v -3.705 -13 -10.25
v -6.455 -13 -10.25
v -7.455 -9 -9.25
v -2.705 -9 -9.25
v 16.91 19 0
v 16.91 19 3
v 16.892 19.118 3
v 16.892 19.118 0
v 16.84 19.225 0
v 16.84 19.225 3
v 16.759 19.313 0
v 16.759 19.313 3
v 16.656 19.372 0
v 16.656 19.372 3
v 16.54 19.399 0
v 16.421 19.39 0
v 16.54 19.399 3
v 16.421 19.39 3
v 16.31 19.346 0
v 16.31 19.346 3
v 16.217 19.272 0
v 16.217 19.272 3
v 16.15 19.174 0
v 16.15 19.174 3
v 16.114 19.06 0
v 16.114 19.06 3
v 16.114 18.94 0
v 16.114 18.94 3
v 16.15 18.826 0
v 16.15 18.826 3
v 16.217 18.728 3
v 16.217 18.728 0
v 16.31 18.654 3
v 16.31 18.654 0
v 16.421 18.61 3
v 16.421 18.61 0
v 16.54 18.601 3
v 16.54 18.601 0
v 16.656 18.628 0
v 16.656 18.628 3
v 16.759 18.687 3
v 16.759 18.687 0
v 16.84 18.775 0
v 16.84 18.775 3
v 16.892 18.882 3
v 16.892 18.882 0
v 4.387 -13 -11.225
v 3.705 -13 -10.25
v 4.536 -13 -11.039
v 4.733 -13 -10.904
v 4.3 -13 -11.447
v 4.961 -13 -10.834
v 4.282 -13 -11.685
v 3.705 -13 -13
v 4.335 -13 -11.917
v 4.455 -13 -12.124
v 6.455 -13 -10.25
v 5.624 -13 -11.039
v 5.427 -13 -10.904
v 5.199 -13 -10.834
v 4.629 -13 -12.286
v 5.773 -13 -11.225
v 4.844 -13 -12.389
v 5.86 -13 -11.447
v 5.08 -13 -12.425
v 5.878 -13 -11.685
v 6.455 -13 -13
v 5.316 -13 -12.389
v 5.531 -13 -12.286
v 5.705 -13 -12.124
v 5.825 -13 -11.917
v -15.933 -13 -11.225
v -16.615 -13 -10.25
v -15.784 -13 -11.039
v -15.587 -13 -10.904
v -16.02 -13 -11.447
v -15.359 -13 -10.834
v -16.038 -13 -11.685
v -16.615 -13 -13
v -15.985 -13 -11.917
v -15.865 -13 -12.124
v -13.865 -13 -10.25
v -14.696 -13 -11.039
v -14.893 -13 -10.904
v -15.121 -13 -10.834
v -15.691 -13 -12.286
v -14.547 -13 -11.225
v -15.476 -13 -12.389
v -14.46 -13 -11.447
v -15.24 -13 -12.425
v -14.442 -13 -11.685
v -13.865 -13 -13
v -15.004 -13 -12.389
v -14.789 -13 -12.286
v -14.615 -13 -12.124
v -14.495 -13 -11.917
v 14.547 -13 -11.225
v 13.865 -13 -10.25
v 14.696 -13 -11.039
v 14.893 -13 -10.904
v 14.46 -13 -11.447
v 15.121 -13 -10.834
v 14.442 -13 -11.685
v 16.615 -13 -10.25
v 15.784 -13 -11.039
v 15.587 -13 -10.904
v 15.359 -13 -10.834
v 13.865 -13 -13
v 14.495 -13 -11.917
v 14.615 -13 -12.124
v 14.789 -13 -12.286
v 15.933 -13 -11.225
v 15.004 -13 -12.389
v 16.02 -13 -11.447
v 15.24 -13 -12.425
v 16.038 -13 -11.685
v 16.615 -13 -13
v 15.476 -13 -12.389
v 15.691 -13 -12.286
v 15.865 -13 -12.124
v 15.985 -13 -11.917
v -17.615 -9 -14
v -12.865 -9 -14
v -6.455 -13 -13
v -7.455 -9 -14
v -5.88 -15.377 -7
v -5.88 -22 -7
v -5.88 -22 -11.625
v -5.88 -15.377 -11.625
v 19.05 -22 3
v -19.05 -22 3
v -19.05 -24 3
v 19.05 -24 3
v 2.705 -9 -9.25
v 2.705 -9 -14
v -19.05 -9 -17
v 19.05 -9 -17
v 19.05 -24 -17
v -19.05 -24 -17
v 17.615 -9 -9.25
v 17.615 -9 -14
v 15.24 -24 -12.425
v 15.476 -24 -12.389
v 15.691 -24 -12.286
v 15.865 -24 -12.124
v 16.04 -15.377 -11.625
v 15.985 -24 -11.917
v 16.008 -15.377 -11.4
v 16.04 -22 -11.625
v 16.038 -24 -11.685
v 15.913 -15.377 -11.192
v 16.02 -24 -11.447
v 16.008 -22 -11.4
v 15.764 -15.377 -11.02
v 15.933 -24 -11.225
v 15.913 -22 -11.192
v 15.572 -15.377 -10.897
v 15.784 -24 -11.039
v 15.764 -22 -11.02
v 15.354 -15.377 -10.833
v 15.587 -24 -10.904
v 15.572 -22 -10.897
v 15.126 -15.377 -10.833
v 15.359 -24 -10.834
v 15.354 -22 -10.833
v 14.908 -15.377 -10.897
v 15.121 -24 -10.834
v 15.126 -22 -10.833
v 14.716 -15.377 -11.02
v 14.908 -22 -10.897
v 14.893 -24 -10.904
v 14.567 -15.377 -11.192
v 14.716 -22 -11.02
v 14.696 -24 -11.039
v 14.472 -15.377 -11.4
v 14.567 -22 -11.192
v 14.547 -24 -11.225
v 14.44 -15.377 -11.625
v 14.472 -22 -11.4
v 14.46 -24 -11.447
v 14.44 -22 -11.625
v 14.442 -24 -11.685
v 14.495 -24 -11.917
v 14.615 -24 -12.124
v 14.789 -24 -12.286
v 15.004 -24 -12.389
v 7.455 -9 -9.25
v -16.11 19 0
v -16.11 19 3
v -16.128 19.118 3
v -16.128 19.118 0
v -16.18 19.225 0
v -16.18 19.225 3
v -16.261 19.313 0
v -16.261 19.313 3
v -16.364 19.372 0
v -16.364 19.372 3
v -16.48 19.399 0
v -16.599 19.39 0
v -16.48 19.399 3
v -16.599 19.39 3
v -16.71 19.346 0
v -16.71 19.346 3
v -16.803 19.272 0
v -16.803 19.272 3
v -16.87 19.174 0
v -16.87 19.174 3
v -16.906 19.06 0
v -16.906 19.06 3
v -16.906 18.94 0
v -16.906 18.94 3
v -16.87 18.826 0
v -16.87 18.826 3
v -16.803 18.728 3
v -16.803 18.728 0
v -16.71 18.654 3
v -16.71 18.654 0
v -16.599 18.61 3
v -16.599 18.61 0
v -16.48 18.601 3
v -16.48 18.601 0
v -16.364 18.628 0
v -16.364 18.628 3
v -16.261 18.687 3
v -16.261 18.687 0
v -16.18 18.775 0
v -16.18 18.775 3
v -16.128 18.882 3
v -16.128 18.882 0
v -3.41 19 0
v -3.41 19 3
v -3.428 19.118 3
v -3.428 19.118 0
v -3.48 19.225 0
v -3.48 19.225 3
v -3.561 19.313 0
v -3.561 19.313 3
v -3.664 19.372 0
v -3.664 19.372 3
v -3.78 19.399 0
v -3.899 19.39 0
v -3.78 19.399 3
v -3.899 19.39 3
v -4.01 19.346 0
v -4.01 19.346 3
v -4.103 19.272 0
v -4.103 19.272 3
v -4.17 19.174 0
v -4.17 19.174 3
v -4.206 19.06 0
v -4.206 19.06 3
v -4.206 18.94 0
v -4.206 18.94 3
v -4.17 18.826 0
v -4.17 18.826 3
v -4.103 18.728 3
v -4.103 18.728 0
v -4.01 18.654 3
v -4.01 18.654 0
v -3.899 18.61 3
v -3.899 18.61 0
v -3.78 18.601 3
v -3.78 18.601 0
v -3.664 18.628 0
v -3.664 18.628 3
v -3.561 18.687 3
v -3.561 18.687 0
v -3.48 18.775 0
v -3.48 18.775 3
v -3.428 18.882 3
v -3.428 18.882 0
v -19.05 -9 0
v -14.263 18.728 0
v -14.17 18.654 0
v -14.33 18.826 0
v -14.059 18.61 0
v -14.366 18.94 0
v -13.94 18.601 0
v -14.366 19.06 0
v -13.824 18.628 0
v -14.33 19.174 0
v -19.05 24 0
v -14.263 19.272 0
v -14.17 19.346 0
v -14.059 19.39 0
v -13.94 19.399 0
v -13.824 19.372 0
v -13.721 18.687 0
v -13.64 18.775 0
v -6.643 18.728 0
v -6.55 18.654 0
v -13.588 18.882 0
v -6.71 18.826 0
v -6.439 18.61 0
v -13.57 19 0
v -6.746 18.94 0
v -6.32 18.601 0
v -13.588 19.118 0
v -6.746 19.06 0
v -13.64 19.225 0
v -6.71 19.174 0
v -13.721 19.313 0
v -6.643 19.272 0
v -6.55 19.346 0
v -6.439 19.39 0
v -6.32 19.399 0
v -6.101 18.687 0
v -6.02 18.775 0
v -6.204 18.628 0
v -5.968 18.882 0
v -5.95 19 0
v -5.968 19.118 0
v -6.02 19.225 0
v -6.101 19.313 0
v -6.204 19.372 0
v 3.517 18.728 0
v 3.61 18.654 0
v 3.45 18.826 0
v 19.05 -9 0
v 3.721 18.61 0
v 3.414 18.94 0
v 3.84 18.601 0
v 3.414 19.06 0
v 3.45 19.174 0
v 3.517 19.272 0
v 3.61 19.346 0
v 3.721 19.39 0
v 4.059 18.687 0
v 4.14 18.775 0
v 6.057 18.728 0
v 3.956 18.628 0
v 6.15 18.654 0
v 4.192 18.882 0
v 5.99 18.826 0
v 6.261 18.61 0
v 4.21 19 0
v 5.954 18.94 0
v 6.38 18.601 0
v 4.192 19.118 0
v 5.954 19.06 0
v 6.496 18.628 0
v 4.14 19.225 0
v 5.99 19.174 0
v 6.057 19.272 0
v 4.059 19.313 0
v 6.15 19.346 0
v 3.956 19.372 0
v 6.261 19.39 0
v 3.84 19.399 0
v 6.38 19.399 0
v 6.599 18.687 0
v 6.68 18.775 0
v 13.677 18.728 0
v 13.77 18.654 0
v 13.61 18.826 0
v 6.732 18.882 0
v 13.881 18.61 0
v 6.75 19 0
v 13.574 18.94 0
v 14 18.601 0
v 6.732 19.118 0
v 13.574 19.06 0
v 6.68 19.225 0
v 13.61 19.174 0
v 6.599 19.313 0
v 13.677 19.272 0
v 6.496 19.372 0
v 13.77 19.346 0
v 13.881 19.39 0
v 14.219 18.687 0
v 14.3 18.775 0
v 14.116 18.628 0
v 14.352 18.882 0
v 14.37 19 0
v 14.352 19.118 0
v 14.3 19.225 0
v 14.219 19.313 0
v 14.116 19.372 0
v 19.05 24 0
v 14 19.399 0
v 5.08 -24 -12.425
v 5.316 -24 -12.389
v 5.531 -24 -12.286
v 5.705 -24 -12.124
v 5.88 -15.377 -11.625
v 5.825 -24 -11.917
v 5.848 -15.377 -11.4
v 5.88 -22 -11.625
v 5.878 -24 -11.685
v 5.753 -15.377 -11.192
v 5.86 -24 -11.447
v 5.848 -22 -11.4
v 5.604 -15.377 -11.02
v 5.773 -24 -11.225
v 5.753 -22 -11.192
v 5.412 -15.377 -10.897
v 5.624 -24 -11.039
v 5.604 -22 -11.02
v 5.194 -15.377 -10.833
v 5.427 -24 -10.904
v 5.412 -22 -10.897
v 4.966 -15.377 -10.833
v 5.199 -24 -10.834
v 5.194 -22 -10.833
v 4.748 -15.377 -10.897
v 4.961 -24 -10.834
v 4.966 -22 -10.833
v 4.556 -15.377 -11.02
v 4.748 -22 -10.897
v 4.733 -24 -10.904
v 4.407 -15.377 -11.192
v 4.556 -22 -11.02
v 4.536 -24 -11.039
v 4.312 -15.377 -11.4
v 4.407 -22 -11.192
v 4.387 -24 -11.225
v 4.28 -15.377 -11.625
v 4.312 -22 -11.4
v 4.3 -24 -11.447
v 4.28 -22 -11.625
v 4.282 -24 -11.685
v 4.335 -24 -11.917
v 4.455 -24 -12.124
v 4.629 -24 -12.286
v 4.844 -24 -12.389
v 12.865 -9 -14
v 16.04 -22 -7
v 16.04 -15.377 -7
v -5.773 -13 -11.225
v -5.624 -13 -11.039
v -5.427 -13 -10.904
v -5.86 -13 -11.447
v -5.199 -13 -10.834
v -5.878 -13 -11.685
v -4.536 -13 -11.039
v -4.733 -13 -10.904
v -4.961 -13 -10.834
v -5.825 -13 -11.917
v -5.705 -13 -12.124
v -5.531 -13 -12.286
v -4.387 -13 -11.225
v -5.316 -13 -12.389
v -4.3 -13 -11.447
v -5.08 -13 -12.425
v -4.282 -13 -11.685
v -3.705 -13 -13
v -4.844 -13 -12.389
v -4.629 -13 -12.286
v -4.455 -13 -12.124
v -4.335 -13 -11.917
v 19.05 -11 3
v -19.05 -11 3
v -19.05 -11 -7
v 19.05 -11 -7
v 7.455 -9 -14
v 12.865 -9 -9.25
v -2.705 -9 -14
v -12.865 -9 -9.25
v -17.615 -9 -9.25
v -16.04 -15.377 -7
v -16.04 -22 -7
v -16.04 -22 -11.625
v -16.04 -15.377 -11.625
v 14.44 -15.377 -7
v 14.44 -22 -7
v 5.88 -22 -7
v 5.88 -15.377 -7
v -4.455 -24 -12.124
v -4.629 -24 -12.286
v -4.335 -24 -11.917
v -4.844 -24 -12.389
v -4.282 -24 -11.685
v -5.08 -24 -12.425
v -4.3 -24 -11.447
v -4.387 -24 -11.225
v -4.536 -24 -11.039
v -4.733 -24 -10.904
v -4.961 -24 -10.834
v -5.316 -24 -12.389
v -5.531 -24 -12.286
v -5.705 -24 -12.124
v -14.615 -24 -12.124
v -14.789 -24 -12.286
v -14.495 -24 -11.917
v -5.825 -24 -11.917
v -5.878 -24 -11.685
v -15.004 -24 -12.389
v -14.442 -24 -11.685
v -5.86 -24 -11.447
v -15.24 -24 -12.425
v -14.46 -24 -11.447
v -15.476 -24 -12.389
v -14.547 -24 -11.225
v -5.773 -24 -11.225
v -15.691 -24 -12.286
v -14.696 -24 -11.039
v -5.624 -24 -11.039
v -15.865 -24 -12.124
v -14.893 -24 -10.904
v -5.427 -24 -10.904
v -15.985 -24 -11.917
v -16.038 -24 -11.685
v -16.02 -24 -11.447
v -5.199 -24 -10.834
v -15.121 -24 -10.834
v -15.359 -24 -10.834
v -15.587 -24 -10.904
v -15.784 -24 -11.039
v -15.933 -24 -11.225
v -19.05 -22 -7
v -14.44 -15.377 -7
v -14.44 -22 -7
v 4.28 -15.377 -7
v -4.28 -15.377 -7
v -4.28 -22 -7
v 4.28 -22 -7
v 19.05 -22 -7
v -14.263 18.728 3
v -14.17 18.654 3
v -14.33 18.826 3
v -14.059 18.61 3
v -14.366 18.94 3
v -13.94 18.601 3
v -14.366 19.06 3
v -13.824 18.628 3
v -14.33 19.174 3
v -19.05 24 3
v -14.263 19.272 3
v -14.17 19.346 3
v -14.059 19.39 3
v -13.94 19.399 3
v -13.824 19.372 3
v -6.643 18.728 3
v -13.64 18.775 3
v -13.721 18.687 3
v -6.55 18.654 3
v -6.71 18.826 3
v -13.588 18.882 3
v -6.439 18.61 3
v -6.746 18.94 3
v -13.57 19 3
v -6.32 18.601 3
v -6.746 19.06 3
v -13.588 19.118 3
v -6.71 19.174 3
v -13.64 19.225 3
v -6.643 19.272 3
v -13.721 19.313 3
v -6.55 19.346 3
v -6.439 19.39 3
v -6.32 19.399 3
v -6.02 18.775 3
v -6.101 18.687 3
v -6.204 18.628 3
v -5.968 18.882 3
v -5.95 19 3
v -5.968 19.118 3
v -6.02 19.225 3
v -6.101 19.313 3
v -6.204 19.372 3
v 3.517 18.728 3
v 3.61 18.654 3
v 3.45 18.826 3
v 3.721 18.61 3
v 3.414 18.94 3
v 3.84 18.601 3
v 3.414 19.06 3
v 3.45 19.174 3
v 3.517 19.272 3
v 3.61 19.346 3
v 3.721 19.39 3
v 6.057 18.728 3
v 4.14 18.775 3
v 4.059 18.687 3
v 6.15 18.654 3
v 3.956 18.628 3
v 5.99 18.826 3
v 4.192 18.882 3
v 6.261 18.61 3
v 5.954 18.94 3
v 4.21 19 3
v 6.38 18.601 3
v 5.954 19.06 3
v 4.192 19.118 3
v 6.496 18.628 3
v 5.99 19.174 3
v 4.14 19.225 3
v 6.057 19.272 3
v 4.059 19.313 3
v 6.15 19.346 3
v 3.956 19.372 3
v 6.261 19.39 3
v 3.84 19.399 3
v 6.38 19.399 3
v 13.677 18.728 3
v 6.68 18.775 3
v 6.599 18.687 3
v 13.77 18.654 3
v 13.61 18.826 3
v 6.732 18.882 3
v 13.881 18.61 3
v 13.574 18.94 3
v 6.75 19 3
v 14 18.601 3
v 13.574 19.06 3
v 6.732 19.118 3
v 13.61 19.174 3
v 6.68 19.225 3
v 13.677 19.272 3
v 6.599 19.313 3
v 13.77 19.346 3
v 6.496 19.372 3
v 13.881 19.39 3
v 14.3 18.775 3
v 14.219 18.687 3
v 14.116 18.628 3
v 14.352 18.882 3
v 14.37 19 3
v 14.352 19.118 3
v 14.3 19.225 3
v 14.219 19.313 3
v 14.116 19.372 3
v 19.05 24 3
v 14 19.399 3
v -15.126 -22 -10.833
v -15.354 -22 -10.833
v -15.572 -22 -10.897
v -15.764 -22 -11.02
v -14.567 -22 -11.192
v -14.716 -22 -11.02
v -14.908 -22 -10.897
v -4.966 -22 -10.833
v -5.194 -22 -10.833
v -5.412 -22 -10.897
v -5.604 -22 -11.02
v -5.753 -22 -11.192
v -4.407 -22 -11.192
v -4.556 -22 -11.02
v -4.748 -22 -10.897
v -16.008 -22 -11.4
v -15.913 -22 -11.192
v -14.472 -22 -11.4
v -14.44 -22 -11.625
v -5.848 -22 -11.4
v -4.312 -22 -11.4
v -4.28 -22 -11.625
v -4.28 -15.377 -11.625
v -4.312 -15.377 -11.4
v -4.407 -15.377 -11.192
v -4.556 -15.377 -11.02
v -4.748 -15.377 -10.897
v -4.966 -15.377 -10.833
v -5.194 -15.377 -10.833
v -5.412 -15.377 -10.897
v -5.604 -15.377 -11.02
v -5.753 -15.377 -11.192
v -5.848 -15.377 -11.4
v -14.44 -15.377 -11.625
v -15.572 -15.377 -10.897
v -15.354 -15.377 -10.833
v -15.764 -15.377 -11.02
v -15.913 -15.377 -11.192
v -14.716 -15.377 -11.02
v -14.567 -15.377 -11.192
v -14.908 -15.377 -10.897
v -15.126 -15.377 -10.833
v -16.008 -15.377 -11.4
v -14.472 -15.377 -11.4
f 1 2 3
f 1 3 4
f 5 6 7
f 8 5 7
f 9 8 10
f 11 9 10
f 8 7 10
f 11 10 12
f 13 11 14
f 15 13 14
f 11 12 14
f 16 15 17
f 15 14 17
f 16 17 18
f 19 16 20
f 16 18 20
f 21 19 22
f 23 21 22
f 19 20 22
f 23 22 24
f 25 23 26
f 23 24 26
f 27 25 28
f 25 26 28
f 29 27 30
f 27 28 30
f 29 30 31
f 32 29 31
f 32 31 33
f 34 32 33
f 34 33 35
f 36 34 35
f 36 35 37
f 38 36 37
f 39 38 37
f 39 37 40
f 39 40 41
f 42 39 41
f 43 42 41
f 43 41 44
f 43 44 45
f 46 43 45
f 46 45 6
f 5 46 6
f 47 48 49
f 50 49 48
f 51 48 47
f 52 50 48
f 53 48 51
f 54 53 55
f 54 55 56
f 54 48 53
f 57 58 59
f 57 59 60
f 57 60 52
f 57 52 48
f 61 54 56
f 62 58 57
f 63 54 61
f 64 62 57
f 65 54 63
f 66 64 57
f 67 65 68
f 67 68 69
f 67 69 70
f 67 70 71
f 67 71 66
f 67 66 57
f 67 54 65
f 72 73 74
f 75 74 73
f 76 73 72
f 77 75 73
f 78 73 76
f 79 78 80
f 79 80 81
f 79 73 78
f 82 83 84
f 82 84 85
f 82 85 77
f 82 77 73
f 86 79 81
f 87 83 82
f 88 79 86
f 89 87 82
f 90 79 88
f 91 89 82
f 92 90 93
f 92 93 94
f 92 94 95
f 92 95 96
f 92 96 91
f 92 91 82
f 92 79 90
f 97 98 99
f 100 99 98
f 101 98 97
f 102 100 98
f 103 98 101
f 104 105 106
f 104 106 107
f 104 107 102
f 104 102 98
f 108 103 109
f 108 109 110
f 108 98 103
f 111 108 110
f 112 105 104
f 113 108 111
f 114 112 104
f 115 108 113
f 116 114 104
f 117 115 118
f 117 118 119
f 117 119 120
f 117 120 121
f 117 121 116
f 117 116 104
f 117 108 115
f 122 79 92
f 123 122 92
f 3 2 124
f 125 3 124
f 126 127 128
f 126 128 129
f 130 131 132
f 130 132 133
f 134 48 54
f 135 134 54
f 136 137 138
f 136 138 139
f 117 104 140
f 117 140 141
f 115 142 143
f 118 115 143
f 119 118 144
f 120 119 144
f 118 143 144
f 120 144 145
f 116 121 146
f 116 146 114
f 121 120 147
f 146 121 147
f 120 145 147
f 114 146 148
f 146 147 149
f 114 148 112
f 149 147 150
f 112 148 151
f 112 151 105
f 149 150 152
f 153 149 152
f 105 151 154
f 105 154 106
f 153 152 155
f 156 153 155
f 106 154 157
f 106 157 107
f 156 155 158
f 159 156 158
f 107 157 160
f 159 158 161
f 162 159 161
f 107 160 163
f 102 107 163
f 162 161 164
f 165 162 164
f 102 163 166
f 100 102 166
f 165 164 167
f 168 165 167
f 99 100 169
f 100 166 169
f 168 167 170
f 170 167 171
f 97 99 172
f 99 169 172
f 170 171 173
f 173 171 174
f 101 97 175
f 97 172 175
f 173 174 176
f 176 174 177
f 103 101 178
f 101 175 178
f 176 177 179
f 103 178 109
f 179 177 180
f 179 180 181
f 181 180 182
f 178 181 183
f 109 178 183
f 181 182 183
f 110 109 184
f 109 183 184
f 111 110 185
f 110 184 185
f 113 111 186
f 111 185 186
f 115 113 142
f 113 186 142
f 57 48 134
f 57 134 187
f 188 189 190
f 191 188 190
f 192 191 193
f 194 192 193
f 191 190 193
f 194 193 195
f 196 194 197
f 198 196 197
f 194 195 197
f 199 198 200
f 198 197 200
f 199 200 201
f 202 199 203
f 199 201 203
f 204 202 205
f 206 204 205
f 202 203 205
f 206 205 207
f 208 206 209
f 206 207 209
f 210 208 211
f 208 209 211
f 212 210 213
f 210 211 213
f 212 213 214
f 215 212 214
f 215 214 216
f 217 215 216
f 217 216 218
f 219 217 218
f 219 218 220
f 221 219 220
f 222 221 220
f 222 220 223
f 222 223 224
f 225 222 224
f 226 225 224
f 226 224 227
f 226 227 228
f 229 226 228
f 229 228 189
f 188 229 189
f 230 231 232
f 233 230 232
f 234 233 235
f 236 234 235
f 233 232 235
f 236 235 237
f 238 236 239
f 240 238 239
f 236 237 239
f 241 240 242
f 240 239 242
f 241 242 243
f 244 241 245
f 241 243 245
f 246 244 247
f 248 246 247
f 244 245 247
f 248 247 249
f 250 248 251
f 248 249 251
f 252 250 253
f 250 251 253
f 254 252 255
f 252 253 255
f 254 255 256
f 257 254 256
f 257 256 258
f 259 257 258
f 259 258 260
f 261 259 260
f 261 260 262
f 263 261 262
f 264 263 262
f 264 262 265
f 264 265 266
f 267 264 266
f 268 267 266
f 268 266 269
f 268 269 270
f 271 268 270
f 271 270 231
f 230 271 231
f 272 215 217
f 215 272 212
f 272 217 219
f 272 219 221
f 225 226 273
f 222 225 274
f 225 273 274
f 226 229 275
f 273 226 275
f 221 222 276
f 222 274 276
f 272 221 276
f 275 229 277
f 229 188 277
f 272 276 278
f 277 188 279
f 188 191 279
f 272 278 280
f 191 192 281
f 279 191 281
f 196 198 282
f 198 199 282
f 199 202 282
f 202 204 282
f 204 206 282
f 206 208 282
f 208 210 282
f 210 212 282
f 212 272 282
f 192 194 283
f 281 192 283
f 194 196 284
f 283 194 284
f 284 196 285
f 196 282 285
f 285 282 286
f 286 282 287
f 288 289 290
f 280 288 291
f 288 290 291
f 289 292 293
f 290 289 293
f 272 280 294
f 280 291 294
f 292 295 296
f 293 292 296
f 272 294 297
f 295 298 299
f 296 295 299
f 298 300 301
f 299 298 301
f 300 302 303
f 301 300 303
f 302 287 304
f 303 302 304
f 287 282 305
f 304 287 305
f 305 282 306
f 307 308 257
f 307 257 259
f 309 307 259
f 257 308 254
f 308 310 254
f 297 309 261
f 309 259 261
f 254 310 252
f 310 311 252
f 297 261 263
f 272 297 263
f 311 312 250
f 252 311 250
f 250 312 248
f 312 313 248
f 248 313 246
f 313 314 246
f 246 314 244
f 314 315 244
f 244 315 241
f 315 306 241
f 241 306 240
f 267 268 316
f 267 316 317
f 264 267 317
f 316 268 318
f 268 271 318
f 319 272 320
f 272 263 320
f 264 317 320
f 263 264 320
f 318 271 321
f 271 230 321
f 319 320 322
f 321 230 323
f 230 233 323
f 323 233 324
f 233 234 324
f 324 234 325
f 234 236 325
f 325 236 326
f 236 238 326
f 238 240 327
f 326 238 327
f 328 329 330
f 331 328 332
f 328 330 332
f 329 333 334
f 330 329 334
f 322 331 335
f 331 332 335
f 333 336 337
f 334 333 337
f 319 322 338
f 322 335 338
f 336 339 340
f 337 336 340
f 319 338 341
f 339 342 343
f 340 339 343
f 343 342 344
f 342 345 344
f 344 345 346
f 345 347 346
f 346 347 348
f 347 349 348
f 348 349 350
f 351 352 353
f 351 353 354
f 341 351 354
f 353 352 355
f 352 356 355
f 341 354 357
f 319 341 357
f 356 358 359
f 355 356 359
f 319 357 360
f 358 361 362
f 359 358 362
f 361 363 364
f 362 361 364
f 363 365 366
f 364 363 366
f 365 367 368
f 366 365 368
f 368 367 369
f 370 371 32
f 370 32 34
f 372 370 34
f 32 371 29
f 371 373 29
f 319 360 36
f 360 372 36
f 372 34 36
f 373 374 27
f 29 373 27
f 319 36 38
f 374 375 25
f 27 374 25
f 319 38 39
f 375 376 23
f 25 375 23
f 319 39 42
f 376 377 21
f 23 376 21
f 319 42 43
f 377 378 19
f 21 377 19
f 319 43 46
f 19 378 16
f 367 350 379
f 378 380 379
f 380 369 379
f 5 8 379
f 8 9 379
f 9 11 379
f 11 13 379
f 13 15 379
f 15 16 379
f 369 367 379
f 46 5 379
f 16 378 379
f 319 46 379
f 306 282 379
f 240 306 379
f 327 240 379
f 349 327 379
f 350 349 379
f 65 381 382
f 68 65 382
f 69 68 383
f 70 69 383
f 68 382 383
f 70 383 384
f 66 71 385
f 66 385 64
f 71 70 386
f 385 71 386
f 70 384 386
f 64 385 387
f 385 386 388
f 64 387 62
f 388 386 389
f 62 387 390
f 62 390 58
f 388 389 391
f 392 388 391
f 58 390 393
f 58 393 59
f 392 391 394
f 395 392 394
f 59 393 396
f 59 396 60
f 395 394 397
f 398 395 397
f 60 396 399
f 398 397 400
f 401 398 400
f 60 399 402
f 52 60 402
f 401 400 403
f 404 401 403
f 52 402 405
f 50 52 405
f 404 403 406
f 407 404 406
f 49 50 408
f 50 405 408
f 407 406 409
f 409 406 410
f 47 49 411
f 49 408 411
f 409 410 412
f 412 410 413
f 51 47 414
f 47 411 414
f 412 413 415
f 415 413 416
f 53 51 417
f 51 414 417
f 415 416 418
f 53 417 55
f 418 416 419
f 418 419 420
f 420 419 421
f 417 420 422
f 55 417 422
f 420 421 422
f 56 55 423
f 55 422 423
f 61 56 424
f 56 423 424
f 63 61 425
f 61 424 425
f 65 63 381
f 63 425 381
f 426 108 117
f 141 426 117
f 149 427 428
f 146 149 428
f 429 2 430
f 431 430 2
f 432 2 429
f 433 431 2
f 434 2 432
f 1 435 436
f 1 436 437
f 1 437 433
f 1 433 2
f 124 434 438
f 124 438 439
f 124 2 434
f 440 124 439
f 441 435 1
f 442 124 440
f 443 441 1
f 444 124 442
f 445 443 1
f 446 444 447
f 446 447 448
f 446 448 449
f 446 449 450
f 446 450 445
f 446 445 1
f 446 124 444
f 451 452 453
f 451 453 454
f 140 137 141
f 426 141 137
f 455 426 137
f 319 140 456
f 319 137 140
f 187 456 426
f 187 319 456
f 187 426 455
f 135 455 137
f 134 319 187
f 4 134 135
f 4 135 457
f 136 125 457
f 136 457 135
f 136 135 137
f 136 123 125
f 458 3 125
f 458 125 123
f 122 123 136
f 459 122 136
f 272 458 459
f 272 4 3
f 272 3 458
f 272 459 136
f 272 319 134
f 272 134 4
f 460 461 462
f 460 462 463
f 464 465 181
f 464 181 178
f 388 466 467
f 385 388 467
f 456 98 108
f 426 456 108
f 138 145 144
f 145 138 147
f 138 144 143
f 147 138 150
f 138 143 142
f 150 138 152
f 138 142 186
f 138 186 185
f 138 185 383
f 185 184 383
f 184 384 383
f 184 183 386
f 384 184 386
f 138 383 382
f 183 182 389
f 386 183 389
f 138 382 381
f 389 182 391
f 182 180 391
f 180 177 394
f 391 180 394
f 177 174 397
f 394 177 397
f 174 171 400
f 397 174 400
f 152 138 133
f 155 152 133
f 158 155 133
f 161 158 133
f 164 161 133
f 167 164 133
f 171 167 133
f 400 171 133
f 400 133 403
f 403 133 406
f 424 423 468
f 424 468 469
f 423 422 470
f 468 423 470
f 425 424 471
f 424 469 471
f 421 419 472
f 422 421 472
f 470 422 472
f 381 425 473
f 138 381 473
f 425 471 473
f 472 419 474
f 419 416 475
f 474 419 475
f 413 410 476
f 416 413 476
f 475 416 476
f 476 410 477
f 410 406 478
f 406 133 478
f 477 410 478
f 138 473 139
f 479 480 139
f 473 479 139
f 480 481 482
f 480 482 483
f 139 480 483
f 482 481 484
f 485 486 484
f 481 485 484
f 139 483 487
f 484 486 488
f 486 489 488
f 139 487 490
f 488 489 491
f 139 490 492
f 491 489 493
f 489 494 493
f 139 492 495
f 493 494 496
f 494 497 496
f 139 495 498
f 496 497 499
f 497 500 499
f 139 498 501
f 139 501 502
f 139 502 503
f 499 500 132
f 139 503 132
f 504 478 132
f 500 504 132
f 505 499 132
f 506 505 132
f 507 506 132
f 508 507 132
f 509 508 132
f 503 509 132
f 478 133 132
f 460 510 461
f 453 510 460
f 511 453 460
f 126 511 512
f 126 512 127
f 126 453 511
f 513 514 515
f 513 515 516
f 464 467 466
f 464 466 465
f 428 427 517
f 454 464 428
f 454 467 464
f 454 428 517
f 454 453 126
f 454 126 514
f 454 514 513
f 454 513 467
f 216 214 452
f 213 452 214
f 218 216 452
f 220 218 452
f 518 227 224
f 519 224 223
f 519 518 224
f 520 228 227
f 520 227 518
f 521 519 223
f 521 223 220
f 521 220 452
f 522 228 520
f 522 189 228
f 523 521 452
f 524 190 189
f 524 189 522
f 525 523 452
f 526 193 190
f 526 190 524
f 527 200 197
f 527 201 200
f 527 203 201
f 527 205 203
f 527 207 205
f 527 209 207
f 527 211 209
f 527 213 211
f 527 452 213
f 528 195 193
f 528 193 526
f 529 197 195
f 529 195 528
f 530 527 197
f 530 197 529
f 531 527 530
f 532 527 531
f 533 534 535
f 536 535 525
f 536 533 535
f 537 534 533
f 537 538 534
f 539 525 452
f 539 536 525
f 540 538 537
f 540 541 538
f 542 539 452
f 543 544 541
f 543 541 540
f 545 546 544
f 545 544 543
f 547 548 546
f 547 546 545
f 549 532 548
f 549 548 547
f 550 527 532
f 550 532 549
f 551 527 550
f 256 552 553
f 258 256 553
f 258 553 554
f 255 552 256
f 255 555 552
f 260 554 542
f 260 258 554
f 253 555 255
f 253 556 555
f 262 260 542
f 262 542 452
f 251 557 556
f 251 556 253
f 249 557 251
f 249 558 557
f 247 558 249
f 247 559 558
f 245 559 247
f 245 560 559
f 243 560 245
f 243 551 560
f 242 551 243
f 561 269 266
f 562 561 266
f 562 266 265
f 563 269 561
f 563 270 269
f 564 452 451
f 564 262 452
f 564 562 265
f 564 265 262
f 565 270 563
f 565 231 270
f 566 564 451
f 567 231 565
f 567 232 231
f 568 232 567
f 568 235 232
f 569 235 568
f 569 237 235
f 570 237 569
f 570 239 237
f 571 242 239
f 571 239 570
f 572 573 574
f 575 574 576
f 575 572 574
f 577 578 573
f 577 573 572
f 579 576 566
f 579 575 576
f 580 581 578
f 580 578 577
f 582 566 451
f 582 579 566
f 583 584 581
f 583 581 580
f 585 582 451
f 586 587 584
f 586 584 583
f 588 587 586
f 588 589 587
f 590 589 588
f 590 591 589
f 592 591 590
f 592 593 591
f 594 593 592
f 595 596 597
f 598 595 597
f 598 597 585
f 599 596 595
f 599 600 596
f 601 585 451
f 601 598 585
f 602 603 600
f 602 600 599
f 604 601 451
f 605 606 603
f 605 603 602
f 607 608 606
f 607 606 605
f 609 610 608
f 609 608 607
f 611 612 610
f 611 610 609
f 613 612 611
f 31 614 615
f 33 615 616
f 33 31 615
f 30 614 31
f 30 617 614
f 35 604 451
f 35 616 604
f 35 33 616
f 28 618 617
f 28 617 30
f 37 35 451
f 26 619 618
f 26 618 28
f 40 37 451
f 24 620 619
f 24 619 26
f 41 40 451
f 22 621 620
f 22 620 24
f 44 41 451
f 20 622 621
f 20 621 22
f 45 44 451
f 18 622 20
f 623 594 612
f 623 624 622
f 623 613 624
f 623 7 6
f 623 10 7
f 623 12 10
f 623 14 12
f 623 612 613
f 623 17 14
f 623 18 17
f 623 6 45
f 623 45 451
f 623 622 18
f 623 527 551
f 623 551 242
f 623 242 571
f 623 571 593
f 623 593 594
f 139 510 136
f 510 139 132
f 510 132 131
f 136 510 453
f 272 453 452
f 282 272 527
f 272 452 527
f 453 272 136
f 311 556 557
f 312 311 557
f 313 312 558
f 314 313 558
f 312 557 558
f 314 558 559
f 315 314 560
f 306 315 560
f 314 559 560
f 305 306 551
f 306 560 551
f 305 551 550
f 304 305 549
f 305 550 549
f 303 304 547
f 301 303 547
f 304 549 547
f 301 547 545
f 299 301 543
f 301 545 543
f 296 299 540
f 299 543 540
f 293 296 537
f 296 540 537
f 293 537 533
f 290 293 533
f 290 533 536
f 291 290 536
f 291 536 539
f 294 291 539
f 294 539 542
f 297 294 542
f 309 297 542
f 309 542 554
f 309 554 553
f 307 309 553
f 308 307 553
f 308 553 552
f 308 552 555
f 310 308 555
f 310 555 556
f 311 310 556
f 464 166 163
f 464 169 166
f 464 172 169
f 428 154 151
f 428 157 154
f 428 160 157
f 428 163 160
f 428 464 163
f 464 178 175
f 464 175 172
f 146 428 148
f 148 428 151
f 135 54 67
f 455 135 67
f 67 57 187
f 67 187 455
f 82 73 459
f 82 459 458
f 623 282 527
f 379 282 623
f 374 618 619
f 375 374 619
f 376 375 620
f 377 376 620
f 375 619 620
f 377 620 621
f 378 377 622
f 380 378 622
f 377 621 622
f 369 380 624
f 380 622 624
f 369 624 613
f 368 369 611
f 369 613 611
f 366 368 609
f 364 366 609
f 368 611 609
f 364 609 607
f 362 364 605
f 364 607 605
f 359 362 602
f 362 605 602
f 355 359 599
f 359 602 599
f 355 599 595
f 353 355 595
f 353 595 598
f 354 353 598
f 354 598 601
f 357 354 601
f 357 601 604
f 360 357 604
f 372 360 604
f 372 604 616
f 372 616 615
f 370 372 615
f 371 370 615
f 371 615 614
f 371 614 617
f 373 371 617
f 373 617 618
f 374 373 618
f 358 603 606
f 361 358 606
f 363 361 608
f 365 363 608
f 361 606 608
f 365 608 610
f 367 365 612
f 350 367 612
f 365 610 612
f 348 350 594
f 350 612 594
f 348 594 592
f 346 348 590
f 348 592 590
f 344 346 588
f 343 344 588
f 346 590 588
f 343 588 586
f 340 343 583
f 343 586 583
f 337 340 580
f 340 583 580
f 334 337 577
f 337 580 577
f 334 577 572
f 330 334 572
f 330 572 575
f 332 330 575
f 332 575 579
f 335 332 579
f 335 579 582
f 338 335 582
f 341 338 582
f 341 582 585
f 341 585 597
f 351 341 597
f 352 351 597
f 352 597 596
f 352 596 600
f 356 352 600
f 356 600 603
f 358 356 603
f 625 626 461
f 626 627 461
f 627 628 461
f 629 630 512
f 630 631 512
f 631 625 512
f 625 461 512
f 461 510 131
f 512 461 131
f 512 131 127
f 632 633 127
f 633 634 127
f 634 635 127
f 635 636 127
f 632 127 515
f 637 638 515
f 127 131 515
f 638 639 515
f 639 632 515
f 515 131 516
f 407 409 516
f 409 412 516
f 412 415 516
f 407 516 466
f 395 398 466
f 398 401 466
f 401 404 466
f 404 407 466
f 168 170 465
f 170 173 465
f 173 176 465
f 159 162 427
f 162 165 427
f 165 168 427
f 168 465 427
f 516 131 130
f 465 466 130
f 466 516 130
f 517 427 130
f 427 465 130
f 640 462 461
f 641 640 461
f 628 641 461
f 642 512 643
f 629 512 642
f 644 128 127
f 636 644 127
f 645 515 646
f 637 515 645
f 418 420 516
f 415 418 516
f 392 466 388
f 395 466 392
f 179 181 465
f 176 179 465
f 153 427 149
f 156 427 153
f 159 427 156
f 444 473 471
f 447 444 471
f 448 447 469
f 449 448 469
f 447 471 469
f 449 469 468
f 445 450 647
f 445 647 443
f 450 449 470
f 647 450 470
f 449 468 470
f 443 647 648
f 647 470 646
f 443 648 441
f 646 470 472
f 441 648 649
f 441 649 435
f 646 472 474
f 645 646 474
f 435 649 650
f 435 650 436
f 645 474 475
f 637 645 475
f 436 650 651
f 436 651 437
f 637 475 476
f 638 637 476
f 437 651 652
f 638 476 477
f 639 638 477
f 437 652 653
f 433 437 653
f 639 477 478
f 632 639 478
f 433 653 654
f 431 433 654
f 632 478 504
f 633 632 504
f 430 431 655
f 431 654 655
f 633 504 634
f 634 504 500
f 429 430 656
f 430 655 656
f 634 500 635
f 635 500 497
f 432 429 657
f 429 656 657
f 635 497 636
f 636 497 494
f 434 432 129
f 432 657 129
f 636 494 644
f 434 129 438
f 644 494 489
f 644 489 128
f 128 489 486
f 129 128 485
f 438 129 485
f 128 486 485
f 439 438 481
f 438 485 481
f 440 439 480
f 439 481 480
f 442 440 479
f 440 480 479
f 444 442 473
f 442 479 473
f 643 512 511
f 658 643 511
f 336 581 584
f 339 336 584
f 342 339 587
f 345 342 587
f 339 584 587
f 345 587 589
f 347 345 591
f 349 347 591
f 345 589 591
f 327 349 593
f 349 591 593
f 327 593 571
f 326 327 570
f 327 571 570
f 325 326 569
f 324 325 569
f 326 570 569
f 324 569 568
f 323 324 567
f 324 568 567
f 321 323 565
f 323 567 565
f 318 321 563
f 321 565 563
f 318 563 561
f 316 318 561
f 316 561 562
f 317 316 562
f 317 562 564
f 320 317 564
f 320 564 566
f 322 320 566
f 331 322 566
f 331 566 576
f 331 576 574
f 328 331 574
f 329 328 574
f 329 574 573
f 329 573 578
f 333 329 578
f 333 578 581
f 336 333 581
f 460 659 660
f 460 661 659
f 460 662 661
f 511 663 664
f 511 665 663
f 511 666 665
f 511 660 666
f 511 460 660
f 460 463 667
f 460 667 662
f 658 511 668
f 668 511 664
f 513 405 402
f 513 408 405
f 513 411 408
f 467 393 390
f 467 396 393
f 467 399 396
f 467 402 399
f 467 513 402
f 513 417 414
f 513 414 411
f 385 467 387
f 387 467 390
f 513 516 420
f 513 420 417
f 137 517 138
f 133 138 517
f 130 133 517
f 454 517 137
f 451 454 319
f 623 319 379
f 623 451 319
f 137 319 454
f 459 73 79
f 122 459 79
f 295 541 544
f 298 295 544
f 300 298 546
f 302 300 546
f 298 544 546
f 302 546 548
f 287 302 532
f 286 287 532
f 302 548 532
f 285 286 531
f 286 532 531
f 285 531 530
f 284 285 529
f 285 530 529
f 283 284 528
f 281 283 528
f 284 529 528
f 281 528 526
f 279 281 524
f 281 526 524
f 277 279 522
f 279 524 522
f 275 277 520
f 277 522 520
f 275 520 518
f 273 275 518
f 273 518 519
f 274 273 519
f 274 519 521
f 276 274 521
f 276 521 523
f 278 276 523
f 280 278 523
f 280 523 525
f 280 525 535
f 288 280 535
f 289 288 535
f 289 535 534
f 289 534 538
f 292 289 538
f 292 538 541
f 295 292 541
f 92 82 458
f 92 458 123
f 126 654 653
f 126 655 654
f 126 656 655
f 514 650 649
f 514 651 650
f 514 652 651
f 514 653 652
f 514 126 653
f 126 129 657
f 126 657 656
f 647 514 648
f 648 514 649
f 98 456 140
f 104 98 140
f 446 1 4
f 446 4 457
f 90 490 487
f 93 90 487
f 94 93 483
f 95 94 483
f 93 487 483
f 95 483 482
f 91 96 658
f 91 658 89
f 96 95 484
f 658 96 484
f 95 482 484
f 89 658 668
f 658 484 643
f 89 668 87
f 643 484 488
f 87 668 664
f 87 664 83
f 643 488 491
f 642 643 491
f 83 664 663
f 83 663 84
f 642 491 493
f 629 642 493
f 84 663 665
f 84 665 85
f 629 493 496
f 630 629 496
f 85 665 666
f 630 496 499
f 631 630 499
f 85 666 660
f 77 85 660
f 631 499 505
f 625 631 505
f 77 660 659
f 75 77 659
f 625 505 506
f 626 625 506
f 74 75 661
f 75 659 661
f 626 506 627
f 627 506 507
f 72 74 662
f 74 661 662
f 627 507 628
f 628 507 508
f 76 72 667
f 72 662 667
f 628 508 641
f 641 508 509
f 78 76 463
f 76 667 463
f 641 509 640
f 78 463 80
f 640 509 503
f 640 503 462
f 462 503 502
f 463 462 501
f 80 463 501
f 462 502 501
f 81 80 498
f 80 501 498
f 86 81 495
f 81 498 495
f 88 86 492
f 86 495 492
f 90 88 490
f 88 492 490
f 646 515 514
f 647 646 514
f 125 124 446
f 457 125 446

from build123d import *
from OCP.BRepFilletAPI import BRepFilletAPI_MakeChamfer

# Parameters (mm, degrees)
SKETCH_1_W          = 38.1
SKETCH_1_H          = 48
EXTRUDE_1_DEPTH     = 3
SKETCH_2_R          = 0.4
CUT_EXTRUDE_1_DEPTH = 31.78802527
SKETCH_3_W          = 38.1
SKETCH_3_H          = 15
EXTRUDE_2_DEPTH     = 17
SKETCH_4_W          = 2.75
SKETCH_4_H          = 2.75
CUT_EXTRUDE_2_DEPTH = 4
CHAMFER_1_SIZE      = 1
CHAMFER_1_SIZE_2    = 4
SKETCH_5_R          = 0.8
CUT_EXTRUDE_5_DEPTH = 55.36821222
SKETCH_6_W          = 38.1
SKETCH_6_H          = 11
CUT_EXTRUDE_6_DEPTH = 10
CUT_EXTRUDE_7_REACH = 34.232
SKETCH_8_W          = 1.6
SKETCH_8_H          = 6.622641265


with BuildPart() as part:
    # 草圖1 → 填料-伸長1 (new body)
    with BuildSketch(Plane.XY):
        Rectangle(SKETCH_1_W, SKETCH_1_H)
    extrude(amount=EXTRUDE_1_DEPTH)

    # 草圖2 → 除料-伸長1 (cut, through all)
    with BuildSketch(Plane.XY.offset(3)):
        with Locations((-16.51, 19)):
            Circle(SKETCH_2_R)
        with Locations((-13.97, 19)):
            Circle(SKETCH_2_R)
        with Locations((-6.35, 19)):
            Circle(SKETCH_2_R)
        with Locations((-3.81, 19)):
            Circle(SKETCH_2_R)
        with Locations((3.81, 19)):
            Circle(SKETCH_2_R)
        with Locations((6.35, 19)):
            Circle(SKETCH_2_R)
        with Locations((13.97, 19)):
            Circle(SKETCH_2_R)
        with Locations((16.51, 19)):
            Circle(SKETCH_2_R)
    extrude(amount=-CUT_EXTRUDE_1_DEPTH, mode=Mode.SUBTRACT)

    # 草圖3 → 填料-伸長2 (add)
    with BuildSketch(Plane(origin=(0, 0, 0), x_dir=(-1, 0, 0), z_dir=(0, 0, -1))):
        with Locations((0, -16.5)):
            Rectangle(SKETCH_3_W, SKETCH_3_H)
    extrude(amount=EXTRUDE_2_DEPTH)

    # 草圖4 → 除料-伸長2 (cut)
    with BuildSketch(Plane(origin=(0, -9, 0), x_dir=(1, 0, 0), z_dir=(0, 1, 0))):
        with Locations((-15.24, 11.625)):
            Rectangle(SKETCH_4_W, SKETCH_4_H)
        with Locations((-5.08, 11.625)):
            Rectangle(SKETCH_4_W, SKETCH_4_H)
        with Locations((5.08, 11.625)):
            Rectangle(SKETCH_4_W, SKETCH_4_H)
        with Locations((15.24, 11.625)):
            Rectangle(SKETCH_4_W, SKETCH_4_H)
    extrude(amount=-CUT_EXTRUDE_2_DEPTH, mode=Mode.SUBTRACT)

    # 導角1
    chamfer_1_edges_1 = [part.edges().sort_by_distance(p)[0] for p in [
        (-15.24, -9, -13),
    ]]
    chamfer_1_side_1 = [part.faces().sort_by_distance(p)[0] for p in [
        (-15.24, -9, -13.02),
    ]]
    chamfer_1_edges_2 = [part.edges().sort_by_distance(p)[0] for p in [
        (-13.865, -9, -11.625),
    ]]
    chamfer_1_side_2 = [part.faces().sort_by_distance(p)[0] for p in [
        (-13.845, -9, -11.625),
    ]]
    chamfer_1_edges_3 = [part.edges().sort_by_distance(p)[0] for p in [
        (-16.615, -9, -11.625),
    ]]
    chamfer_1_side_3 = [part.faces().sort_by_distance(p)[0] for p in [
        (-16.635, -9, -11.625),
    ]]
    chamfer_1_edges_4 = [part.edges().sort_by_distance(p)[0] for p in [
        (-15.24, -9, -10.25),
    ]]
    chamfer_1_side_4 = [part.faces().sort_by_distance(p)[0] for p in [
        (-15.24, -9, -10.23),
    ]]
    chamfer_1_edges_5 = [part.edges().sort_by_distance(p)[0] for p in [
        (15.24, -9, -10.25),
    ]]
    chamfer_1_side_5 = [part.faces().sort_by_distance(p)[0] for p in [
        (15.24, -9, -10.23),
    ]]
    chamfer_1_edges_6 = [part.edges().sort_by_distance(p)[0] for p in [
        (13.865, -9, -11.625),
    ]]
    chamfer_1_side_6 = [part.faces().sort_by_distance(p)[0] for p in [
        (13.845, -9, -11.625),
    ]]
    chamfer_1_edges_7 = [part.edges().sort_by_distance(p)[0] for p in [
        (16.615, -9, -11.625),
    ]]
    chamfer_1_side_7 = [part.faces().sort_by_distance(p)[0] for p in [
        (16.635, -9, -11.625),
    ]]
    chamfer_1_edges_8 = [part.edges().sort_by_distance(p)[0] for p in [
        (15.24, -9, -13),
    ]]
    chamfer_1_side_8 = [part.faces().sort_by_distance(p)[0] for p in [
        (15.24, -9, -13.02),
    ]]
    chamfer_1_edges_9 = [part.edges().sort_by_distance(p)[0] for p in [
        (5.08, -9, -10.25),
    ]]
    chamfer_1_side_9 = [part.faces().sort_by_distance(p)[0] for p in [
        (5.08, -9, -10.23),
    ]]
    chamfer_1_edges_10 = [part.edges().sort_by_distance(p)[0] for p in [
        (6.455, -9, -11.625),
    ]]
    chamfer_1_side_10 = [part.faces().sort_by_distance(p)[0] for p in [
        (6.475, -9, -11.625),
    ]]
    chamfer_1_edges_11 = [part.edges().sort_by_distance(p)[0] for p in [
        (5.08, -9, -13),
    ]]
    chamfer_1_side_11 = [part.faces().sort_by_distance(p)[0] for p in [
        (5.08, -9, -13.02),
    ]]
    chamfer_1_edges_12 = [part.edges().sort_by_distance(p)[0] for p in [
        (3.705, -9, -11.625),
    ]]
    chamfer_1_side_12 = [part.faces().sort_by_distance(p)[0] for p in [
        (3.685, -9, -11.625),
    ]]
    chamfer_1_edges_13 = [part.edges().sort_by_distance(p)[0] for p in [
        (-5.08, -9, -10.25),
    ]]
    chamfer_1_side_13 = [part.faces().sort_by_distance(p)[0] for p in [
        (-5.08, -9, -10.23),
    ]]
    chamfer_1_edges_14 = [part.edges().sort_by_distance(p)[0] for p in [
        (-6.455, -9, -11.625),
    ]]
    chamfer_1_side_14 = [part.faces().sort_by_distance(p)[0] for p in [
        (-6.475, -9, -11.625),
    ]]
    chamfer_1_edges_15 = [part.edges().sort_by_distance(p)[0] for p in [
        (-5.08, -9, -13),
    ]]
    chamfer_1_side_15 = [part.faces().sort_by_distance(p)[0] for p in [
        (-5.08, -9, -13.02),
    ]]
    chamfer_1_edges_16 = [part.edges().sort_by_distance(p)[0] for p in [
        (-3.705, -9, -11.625),
    ]]
    chamfer_1_side_16 = [part.faces().sort_by_distance(p)[0] for p in [
        (-3.685, -9, -11.625),
    ]]
    chamfer_1 = BRepFilletAPI_MakeChamfer(part.part.solid().wrapped)
    for e in chamfer_1_edges_1:
        chamfer_1.Add(CHAMFER_1_SIZE - 0.0001, CHAMFER_1_SIZE_2 - 0.0001, e.wrapped, chamfer_1_side_1[0].wrapped)
    for e in chamfer_1_edges_2:
        chamfer_1.Add(CHAMFER_1_SIZE - 0.0001, CHAMFER_1_SIZE_2 - 0.0001, e.wrapped, chamfer_1_side_2[0].wrapped)
    for e in chamfer_1_edges_3:
        chamfer_1.Add(CHAMFER_1_SIZE - 0.0001, CHAMFER_1_SIZE_2 - 0.0001, e.wrapped, chamfer_1_side_3[0].wrapped)
    for e in chamfer_1_edges_4:
        chamfer_1.Add(CHAMFER_1_SIZE - 0.0001, CHAMFER_1_SIZE_2 - 0.0001, e.wrapped, chamfer_1_side_4[0].wrapped)
    for e in chamfer_1_edges_5:
        chamfer_1.Add(CHAMFER_1_SIZE - 0.0001, CHAMFER_1_SIZE_2 - 0.0001, e.wrapped, chamfer_1_side_5[0].wrapped)
    for e in chamfer_1_edges_6:
        chamfer_1.Add(CHAMFER_1_SIZE - 0.0001, CHAMFER_1_SIZE_2 - 0.0001, e.wrapped, chamfer_1_side_6[0].wrapped)
    for e in chamfer_1_edges_7:
        chamfer_1.Add(CHAMFER_1_SIZE - 0.0001, CHAMFER_1_SIZE_2 - 0.0001, e.wrapped, chamfer_1_side_7[0].wrapped)
    for e in chamfer_1_edges_8:
        chamfer_1.Add(CHAMFER_1_SIZE - 0.0001, CHAMFER_1_SIZE_2 - 0.0001, e.wrapped, chamfer_1_side_8[0].wrapped)
    for e in chamfer_1_edges_9:
        chamfer_1.Add(CHAMFER_1_SIZE - 0.0001, CHAMFER_1_SIZE_2 - 0.0001, e.wrapped, chamfer_1_side_9[0].wrapped)
    for e in chamfer_1_edges_10:
        chamfer_1.Add(CHAMFER_1_SIZE - 0.0001, CHAMFER_1_SIZE_2 - 0.0001, e.wrapped, chamfer_1_side_10[0].wrapped)
    for e in chamfer_1_edges_11:
        chamfer_1.Add(CHAMFER_1_SIZE - 0.0001, CHAMFER_1_SIZE_2 - 0.0001, e.wrapped, chamfer_1_side_11[0].wrapped)
    for e in chamfer_1_edges_12:
        chamfer_1.Add(CHAMFER_1_SIZE - 0.0001, CHAMFER_1_SIZE_2 - 0.0001, e.wrapped, chamfer_1_side_12[0].wrapped)
    for e in chamfer_1_edges_13:
        chamfer_1.Add(CHAMFER_1_SIZE - 0.0001, CHAMFER_1_SIZE_2 - 0.0001, e.wrapped, chamfer_1_side_13[0].wrapped)
    for e in chamfer_1_edges_14:
        chamfer_1.Add(CHAMFER_1_SIZE - 0.0001, CHAMFER_1_SIZE_2 - 0.0001, e.wrapped, chamfer_1_side_14[0].wrapped)
    for e in chamfer_1_edges_15:
        chamfer_1.Add(CHAMFER_1_SIZE - 0.0001, CHAMFER_1_SIZE_2 - 0.0001, e.wrapped, chamfer_1_side_15[0].wrapped)
    for e in chamfer_1_edges_16:
        chamfer_1.Add(CHAMFER_1_SIZE - 0.0001, CHAMFER_1_SIZE_2 - 0.0001, e.wrapped, chamfer_1_side_16[0].wrapped)
    add(Compound.cast(chamfer_1.Shape()), mode=Mode.REPLACE)  # a hair under: the kernel refuses the full size

    # 草圖5 → 除料-伸長5 (cut, through all)
    with BuildSketch(Plane.XZ.offset(24)):
        with Locations(Location((-15.24, -11.625, 0), (0, 0, 270))):
            Circle(SKETCH_5_R)
        with Locations(Location((-5.08, -11.625, 0), (0, 0, 270))):
            Circle(SKETCH_5_R)
        with Locations(Location((5.08, -11.625, 0), (0, 0, 270))):
            Circle(SKETCH_5_R)
        with Locations(Location((15.24, -11.625, 0), (0, 0, 270))):
            Circle(SKETCH_5_R)
    extrude(amount=-CUT_EXTRUDE_5_DEPTH, mode=Mode.SUBTRACT)

    # 草圖6 → 除料-伸長6 (cut)
    with BuildSketch(Plane.XY.offset(3)):
        with Locations((0, -16.5)):
            Rectangle(SKETCH_6_W, SKETCH_6_H)
    extrude(amount=-CUT_EXTRUDE_6_DEPTH, mode=Mode.SUBTRACT)

    # 草圖8 → 除料-伸長7 (cut, up to next)
    with BuildSketch(Plane.XY.offset(-7), mode=Mode.PRIVATE) as cut_extrude_7_sk1:
        with Locations((-15.24, -18.688679368)):
            Rectangle(SKETCH_8_W, SKETCH_8_H)
    cut_extrude_7_tool1 = extrude(cut_extrude_7_sk1.sketch, amount=-CUT_EXTRUDE_7_REACH, mode=Mode.PRIVATE) & part.part
    # 草圖8 → 除料-伸長7 (cut, up to next)
    with BuildSketch(Plane.XY.offset(-7), mode=Mode.PRIVATE) as cut_extrude_7_sk2:
        with Locations((-5.08, -18.688679368)):
            Rectangle(SKETCH_8_W, SKETCH_8_H)
    cut_extrude_7_tool2 = extrude(cut_extrude_7_sk2.sketch, amount=-CUT_EXTRUDE_7_REACH, mode=Mode.PRIVATE) & part.part
    # 草圖8 → 除料-伸長7 (cut, up to next)
    with BuildSketch(Plane.XY.offset(-7), mode=Mode.PRIVATE) as cut_extrude_7_sk3:
        with Locations((5.08, -18.688679368)):
            Rectangle(SKETCH_8_W, SKETCH_8_H)
    cut_extrude_7_tool3 = extrude(cut_extrude_7_sk3.sketch, amount=-CUT_EXTRUDE_7_REACH, mode=Mode.PRIVATE) & part.part
    # 草圖8 → 除料-伸長7 (cut, up to next)
    with BuildSketch(Plane.XY.offset(-7), mode=Mode.PRIVATE) as cut_extrude_7_sk4:
        with Locations((15.24, -18.688679368)):
            Rectangle(SKETCH_8_W, SKETCH_8_H)
    cut_extrude_7_tool4 = extrude(cut_extrude_7_sk4.sketch, amount=-CUT_EXTRUDE_7_REACH, mode=Mode.PRIVATE) & part.part
    add(cut_extrude_7_tool1.solids().sort_by_distance((-15.24, -18.688679, -7))[0], mode=Mode.SUBTRACT)
    add(cut_extrude_7_tool2.solids().sort_by_distance((-5.08, -18.688679, -7))[0], mode=Mode.SUBTRACT)
    add(cut_extrude_7_tool3.solids().sort_by_distance((5.08, -18.688679, -7))[0], mode=Mode.SUBTRACT)
    add(cut_extrude_7_tool4.solids().sort_by_distance((15.24, -18.688679, -7))[0], mode=Mode.SUBTRACT)


solid = part.part
